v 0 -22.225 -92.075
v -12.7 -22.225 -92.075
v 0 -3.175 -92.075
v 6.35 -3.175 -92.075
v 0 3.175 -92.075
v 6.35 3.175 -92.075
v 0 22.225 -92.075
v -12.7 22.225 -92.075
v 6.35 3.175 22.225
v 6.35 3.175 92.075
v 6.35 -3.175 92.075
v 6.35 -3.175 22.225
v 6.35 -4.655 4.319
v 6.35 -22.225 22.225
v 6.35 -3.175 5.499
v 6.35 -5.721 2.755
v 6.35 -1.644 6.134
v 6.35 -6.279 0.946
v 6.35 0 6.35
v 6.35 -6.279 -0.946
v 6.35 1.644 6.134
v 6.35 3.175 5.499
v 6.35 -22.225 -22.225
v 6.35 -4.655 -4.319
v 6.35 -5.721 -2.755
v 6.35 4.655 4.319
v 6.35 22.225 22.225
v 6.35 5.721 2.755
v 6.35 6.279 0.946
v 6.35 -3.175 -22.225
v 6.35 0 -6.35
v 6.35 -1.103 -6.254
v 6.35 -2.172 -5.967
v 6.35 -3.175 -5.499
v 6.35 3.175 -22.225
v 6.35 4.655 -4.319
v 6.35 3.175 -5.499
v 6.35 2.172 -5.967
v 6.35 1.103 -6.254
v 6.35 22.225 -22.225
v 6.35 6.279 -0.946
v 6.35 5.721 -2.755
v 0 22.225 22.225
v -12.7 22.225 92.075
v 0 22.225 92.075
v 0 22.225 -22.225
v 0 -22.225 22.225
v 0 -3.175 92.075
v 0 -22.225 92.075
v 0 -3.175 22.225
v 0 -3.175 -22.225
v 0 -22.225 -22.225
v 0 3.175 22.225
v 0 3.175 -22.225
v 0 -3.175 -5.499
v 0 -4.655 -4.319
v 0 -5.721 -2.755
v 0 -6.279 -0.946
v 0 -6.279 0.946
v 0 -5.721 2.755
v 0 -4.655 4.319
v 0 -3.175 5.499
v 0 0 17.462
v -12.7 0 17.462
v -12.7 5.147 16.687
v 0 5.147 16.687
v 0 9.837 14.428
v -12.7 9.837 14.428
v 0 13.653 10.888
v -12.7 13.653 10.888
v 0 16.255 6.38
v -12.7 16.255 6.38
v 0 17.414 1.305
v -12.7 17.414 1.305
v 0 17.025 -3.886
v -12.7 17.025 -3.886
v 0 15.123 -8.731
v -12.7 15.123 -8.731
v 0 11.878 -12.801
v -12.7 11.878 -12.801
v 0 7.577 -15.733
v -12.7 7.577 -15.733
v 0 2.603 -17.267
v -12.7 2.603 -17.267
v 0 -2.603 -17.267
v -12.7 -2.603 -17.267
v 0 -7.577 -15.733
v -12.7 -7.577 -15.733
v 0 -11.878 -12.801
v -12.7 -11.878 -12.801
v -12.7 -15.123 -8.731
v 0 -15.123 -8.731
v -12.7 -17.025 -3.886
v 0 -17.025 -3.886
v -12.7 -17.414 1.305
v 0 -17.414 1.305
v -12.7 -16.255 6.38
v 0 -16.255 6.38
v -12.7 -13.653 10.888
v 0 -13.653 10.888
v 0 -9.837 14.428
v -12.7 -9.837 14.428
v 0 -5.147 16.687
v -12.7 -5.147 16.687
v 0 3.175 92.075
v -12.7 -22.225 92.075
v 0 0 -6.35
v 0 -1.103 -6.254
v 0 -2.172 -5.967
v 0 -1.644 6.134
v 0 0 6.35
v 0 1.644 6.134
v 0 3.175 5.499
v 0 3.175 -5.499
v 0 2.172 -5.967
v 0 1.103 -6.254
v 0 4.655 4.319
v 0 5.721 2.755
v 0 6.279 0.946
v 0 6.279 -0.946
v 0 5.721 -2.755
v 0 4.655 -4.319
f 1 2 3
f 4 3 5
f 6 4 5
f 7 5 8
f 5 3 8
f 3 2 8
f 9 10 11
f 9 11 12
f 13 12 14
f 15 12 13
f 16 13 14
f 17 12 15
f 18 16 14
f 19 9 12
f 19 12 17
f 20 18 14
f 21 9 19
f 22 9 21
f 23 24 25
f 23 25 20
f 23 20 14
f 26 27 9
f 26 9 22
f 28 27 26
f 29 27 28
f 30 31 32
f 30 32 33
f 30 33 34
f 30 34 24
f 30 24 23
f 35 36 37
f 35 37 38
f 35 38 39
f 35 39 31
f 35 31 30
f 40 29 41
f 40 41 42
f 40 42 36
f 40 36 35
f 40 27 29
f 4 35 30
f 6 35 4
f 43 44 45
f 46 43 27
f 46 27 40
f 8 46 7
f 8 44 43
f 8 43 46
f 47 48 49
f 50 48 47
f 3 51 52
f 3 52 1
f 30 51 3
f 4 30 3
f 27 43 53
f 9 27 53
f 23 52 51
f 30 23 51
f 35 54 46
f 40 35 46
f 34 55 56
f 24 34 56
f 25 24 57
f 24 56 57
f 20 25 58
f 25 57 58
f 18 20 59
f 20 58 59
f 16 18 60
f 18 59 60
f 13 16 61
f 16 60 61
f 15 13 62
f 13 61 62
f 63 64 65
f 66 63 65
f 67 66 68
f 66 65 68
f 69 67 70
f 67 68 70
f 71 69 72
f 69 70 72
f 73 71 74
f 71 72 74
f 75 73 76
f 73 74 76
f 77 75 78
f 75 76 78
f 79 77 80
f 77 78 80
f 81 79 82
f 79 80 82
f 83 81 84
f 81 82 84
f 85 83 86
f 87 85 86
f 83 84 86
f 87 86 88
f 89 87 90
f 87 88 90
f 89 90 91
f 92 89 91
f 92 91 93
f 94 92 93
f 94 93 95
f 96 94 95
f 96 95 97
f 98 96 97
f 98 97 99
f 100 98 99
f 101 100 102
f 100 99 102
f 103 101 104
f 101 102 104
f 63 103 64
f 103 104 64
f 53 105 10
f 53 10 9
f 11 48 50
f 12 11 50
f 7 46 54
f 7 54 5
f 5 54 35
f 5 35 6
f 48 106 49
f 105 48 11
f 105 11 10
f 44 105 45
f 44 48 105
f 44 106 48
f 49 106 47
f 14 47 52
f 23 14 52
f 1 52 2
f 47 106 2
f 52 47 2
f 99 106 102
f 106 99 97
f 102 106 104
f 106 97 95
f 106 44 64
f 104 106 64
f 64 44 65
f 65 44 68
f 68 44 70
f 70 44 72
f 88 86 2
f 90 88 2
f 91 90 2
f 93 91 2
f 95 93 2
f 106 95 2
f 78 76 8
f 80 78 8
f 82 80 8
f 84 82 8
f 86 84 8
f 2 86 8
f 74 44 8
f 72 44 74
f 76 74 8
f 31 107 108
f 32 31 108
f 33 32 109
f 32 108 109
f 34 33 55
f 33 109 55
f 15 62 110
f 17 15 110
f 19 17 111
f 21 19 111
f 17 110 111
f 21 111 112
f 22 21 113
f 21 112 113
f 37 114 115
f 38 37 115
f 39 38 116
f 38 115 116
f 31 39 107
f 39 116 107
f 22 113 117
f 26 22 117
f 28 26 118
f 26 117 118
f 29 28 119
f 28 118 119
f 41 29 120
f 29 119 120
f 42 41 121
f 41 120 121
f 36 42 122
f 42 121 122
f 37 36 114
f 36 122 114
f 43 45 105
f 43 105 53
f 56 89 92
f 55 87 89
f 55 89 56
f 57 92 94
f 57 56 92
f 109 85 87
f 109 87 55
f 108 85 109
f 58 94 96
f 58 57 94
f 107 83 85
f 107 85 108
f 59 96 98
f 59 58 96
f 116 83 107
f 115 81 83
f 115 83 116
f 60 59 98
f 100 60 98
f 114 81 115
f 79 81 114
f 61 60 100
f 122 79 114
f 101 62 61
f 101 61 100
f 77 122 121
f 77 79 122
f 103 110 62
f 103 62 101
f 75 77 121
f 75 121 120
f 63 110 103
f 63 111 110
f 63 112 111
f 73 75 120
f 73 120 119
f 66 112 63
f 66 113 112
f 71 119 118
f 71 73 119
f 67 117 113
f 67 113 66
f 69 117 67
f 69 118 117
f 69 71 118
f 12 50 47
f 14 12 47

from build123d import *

# Parameters (mm, degrees)
SKETCH2_R           = 6.35
BOSS_EXTRUDE1_DEPTH = 6.35
BOSS_EXTRUDE2_START = -12.7
SKETCH2_3_W         = 184.15
SKETCH2_3_H         = 44.45
SKETCH2_3_R         = 6.35
BOSS_EXTRUDE2_DEPTH = 12.7
SKETCH3_R           = 17.4625
CUT_EXTRUDE1_DEPTH  = 12.7


with BuildPart() as part:
    # Sketch2 → Boss-Extrude1 (new body)
    with BuildSketch(Plane(origin=(0, 0, 0), x_dir=(0, 0, -1), z_dir=(1, 0, 0))):
        Polygon((-22.225, -3.175), (-22.225, -22.225), (22.225, -22.225), (22.225, -3.175), (92.075, -3.175), (92.075, 3.175), (22.225, 3.175), (22.225, 22.225), (-22.225, 22.225), (-22.225, 3.175), (-92.075, 3.175), (-92.075, -3.175), align=None)
        Circle(SKETCH2_R, mode=Mode.SUBTRACT)
    extrude(amount=BOSS_EXTRUDE1_DEPTH)

    # Sketch2<3> → Boss-Extrude2 (add)
    with BuildSketch(Plane(origin=(0, 0, 0), x_dir=(0, 0, -1), z_dir=(1, 0, 0)).offset(BOSS_EXTRUDE2_START)):
        Rectangle(SKETCH2_3_W, SKETCH2_3_H)
        Circle(SKETCH2_3_R, mode=Mode.SUBTRACT)
    extrude(amount=BOSS_EXTRUDE2_DEPTH)

    # Sketch3 → Cut-Extrude1 (cut)
    with BuildSketch(Plane.ZY.offset(12.7)):
        Circle(SKETCH3_R)
    extrude(amount=-CUT_EXTRUDE1_DEPTH, mode=Mode.SUBTRACT)


solid = part.part
